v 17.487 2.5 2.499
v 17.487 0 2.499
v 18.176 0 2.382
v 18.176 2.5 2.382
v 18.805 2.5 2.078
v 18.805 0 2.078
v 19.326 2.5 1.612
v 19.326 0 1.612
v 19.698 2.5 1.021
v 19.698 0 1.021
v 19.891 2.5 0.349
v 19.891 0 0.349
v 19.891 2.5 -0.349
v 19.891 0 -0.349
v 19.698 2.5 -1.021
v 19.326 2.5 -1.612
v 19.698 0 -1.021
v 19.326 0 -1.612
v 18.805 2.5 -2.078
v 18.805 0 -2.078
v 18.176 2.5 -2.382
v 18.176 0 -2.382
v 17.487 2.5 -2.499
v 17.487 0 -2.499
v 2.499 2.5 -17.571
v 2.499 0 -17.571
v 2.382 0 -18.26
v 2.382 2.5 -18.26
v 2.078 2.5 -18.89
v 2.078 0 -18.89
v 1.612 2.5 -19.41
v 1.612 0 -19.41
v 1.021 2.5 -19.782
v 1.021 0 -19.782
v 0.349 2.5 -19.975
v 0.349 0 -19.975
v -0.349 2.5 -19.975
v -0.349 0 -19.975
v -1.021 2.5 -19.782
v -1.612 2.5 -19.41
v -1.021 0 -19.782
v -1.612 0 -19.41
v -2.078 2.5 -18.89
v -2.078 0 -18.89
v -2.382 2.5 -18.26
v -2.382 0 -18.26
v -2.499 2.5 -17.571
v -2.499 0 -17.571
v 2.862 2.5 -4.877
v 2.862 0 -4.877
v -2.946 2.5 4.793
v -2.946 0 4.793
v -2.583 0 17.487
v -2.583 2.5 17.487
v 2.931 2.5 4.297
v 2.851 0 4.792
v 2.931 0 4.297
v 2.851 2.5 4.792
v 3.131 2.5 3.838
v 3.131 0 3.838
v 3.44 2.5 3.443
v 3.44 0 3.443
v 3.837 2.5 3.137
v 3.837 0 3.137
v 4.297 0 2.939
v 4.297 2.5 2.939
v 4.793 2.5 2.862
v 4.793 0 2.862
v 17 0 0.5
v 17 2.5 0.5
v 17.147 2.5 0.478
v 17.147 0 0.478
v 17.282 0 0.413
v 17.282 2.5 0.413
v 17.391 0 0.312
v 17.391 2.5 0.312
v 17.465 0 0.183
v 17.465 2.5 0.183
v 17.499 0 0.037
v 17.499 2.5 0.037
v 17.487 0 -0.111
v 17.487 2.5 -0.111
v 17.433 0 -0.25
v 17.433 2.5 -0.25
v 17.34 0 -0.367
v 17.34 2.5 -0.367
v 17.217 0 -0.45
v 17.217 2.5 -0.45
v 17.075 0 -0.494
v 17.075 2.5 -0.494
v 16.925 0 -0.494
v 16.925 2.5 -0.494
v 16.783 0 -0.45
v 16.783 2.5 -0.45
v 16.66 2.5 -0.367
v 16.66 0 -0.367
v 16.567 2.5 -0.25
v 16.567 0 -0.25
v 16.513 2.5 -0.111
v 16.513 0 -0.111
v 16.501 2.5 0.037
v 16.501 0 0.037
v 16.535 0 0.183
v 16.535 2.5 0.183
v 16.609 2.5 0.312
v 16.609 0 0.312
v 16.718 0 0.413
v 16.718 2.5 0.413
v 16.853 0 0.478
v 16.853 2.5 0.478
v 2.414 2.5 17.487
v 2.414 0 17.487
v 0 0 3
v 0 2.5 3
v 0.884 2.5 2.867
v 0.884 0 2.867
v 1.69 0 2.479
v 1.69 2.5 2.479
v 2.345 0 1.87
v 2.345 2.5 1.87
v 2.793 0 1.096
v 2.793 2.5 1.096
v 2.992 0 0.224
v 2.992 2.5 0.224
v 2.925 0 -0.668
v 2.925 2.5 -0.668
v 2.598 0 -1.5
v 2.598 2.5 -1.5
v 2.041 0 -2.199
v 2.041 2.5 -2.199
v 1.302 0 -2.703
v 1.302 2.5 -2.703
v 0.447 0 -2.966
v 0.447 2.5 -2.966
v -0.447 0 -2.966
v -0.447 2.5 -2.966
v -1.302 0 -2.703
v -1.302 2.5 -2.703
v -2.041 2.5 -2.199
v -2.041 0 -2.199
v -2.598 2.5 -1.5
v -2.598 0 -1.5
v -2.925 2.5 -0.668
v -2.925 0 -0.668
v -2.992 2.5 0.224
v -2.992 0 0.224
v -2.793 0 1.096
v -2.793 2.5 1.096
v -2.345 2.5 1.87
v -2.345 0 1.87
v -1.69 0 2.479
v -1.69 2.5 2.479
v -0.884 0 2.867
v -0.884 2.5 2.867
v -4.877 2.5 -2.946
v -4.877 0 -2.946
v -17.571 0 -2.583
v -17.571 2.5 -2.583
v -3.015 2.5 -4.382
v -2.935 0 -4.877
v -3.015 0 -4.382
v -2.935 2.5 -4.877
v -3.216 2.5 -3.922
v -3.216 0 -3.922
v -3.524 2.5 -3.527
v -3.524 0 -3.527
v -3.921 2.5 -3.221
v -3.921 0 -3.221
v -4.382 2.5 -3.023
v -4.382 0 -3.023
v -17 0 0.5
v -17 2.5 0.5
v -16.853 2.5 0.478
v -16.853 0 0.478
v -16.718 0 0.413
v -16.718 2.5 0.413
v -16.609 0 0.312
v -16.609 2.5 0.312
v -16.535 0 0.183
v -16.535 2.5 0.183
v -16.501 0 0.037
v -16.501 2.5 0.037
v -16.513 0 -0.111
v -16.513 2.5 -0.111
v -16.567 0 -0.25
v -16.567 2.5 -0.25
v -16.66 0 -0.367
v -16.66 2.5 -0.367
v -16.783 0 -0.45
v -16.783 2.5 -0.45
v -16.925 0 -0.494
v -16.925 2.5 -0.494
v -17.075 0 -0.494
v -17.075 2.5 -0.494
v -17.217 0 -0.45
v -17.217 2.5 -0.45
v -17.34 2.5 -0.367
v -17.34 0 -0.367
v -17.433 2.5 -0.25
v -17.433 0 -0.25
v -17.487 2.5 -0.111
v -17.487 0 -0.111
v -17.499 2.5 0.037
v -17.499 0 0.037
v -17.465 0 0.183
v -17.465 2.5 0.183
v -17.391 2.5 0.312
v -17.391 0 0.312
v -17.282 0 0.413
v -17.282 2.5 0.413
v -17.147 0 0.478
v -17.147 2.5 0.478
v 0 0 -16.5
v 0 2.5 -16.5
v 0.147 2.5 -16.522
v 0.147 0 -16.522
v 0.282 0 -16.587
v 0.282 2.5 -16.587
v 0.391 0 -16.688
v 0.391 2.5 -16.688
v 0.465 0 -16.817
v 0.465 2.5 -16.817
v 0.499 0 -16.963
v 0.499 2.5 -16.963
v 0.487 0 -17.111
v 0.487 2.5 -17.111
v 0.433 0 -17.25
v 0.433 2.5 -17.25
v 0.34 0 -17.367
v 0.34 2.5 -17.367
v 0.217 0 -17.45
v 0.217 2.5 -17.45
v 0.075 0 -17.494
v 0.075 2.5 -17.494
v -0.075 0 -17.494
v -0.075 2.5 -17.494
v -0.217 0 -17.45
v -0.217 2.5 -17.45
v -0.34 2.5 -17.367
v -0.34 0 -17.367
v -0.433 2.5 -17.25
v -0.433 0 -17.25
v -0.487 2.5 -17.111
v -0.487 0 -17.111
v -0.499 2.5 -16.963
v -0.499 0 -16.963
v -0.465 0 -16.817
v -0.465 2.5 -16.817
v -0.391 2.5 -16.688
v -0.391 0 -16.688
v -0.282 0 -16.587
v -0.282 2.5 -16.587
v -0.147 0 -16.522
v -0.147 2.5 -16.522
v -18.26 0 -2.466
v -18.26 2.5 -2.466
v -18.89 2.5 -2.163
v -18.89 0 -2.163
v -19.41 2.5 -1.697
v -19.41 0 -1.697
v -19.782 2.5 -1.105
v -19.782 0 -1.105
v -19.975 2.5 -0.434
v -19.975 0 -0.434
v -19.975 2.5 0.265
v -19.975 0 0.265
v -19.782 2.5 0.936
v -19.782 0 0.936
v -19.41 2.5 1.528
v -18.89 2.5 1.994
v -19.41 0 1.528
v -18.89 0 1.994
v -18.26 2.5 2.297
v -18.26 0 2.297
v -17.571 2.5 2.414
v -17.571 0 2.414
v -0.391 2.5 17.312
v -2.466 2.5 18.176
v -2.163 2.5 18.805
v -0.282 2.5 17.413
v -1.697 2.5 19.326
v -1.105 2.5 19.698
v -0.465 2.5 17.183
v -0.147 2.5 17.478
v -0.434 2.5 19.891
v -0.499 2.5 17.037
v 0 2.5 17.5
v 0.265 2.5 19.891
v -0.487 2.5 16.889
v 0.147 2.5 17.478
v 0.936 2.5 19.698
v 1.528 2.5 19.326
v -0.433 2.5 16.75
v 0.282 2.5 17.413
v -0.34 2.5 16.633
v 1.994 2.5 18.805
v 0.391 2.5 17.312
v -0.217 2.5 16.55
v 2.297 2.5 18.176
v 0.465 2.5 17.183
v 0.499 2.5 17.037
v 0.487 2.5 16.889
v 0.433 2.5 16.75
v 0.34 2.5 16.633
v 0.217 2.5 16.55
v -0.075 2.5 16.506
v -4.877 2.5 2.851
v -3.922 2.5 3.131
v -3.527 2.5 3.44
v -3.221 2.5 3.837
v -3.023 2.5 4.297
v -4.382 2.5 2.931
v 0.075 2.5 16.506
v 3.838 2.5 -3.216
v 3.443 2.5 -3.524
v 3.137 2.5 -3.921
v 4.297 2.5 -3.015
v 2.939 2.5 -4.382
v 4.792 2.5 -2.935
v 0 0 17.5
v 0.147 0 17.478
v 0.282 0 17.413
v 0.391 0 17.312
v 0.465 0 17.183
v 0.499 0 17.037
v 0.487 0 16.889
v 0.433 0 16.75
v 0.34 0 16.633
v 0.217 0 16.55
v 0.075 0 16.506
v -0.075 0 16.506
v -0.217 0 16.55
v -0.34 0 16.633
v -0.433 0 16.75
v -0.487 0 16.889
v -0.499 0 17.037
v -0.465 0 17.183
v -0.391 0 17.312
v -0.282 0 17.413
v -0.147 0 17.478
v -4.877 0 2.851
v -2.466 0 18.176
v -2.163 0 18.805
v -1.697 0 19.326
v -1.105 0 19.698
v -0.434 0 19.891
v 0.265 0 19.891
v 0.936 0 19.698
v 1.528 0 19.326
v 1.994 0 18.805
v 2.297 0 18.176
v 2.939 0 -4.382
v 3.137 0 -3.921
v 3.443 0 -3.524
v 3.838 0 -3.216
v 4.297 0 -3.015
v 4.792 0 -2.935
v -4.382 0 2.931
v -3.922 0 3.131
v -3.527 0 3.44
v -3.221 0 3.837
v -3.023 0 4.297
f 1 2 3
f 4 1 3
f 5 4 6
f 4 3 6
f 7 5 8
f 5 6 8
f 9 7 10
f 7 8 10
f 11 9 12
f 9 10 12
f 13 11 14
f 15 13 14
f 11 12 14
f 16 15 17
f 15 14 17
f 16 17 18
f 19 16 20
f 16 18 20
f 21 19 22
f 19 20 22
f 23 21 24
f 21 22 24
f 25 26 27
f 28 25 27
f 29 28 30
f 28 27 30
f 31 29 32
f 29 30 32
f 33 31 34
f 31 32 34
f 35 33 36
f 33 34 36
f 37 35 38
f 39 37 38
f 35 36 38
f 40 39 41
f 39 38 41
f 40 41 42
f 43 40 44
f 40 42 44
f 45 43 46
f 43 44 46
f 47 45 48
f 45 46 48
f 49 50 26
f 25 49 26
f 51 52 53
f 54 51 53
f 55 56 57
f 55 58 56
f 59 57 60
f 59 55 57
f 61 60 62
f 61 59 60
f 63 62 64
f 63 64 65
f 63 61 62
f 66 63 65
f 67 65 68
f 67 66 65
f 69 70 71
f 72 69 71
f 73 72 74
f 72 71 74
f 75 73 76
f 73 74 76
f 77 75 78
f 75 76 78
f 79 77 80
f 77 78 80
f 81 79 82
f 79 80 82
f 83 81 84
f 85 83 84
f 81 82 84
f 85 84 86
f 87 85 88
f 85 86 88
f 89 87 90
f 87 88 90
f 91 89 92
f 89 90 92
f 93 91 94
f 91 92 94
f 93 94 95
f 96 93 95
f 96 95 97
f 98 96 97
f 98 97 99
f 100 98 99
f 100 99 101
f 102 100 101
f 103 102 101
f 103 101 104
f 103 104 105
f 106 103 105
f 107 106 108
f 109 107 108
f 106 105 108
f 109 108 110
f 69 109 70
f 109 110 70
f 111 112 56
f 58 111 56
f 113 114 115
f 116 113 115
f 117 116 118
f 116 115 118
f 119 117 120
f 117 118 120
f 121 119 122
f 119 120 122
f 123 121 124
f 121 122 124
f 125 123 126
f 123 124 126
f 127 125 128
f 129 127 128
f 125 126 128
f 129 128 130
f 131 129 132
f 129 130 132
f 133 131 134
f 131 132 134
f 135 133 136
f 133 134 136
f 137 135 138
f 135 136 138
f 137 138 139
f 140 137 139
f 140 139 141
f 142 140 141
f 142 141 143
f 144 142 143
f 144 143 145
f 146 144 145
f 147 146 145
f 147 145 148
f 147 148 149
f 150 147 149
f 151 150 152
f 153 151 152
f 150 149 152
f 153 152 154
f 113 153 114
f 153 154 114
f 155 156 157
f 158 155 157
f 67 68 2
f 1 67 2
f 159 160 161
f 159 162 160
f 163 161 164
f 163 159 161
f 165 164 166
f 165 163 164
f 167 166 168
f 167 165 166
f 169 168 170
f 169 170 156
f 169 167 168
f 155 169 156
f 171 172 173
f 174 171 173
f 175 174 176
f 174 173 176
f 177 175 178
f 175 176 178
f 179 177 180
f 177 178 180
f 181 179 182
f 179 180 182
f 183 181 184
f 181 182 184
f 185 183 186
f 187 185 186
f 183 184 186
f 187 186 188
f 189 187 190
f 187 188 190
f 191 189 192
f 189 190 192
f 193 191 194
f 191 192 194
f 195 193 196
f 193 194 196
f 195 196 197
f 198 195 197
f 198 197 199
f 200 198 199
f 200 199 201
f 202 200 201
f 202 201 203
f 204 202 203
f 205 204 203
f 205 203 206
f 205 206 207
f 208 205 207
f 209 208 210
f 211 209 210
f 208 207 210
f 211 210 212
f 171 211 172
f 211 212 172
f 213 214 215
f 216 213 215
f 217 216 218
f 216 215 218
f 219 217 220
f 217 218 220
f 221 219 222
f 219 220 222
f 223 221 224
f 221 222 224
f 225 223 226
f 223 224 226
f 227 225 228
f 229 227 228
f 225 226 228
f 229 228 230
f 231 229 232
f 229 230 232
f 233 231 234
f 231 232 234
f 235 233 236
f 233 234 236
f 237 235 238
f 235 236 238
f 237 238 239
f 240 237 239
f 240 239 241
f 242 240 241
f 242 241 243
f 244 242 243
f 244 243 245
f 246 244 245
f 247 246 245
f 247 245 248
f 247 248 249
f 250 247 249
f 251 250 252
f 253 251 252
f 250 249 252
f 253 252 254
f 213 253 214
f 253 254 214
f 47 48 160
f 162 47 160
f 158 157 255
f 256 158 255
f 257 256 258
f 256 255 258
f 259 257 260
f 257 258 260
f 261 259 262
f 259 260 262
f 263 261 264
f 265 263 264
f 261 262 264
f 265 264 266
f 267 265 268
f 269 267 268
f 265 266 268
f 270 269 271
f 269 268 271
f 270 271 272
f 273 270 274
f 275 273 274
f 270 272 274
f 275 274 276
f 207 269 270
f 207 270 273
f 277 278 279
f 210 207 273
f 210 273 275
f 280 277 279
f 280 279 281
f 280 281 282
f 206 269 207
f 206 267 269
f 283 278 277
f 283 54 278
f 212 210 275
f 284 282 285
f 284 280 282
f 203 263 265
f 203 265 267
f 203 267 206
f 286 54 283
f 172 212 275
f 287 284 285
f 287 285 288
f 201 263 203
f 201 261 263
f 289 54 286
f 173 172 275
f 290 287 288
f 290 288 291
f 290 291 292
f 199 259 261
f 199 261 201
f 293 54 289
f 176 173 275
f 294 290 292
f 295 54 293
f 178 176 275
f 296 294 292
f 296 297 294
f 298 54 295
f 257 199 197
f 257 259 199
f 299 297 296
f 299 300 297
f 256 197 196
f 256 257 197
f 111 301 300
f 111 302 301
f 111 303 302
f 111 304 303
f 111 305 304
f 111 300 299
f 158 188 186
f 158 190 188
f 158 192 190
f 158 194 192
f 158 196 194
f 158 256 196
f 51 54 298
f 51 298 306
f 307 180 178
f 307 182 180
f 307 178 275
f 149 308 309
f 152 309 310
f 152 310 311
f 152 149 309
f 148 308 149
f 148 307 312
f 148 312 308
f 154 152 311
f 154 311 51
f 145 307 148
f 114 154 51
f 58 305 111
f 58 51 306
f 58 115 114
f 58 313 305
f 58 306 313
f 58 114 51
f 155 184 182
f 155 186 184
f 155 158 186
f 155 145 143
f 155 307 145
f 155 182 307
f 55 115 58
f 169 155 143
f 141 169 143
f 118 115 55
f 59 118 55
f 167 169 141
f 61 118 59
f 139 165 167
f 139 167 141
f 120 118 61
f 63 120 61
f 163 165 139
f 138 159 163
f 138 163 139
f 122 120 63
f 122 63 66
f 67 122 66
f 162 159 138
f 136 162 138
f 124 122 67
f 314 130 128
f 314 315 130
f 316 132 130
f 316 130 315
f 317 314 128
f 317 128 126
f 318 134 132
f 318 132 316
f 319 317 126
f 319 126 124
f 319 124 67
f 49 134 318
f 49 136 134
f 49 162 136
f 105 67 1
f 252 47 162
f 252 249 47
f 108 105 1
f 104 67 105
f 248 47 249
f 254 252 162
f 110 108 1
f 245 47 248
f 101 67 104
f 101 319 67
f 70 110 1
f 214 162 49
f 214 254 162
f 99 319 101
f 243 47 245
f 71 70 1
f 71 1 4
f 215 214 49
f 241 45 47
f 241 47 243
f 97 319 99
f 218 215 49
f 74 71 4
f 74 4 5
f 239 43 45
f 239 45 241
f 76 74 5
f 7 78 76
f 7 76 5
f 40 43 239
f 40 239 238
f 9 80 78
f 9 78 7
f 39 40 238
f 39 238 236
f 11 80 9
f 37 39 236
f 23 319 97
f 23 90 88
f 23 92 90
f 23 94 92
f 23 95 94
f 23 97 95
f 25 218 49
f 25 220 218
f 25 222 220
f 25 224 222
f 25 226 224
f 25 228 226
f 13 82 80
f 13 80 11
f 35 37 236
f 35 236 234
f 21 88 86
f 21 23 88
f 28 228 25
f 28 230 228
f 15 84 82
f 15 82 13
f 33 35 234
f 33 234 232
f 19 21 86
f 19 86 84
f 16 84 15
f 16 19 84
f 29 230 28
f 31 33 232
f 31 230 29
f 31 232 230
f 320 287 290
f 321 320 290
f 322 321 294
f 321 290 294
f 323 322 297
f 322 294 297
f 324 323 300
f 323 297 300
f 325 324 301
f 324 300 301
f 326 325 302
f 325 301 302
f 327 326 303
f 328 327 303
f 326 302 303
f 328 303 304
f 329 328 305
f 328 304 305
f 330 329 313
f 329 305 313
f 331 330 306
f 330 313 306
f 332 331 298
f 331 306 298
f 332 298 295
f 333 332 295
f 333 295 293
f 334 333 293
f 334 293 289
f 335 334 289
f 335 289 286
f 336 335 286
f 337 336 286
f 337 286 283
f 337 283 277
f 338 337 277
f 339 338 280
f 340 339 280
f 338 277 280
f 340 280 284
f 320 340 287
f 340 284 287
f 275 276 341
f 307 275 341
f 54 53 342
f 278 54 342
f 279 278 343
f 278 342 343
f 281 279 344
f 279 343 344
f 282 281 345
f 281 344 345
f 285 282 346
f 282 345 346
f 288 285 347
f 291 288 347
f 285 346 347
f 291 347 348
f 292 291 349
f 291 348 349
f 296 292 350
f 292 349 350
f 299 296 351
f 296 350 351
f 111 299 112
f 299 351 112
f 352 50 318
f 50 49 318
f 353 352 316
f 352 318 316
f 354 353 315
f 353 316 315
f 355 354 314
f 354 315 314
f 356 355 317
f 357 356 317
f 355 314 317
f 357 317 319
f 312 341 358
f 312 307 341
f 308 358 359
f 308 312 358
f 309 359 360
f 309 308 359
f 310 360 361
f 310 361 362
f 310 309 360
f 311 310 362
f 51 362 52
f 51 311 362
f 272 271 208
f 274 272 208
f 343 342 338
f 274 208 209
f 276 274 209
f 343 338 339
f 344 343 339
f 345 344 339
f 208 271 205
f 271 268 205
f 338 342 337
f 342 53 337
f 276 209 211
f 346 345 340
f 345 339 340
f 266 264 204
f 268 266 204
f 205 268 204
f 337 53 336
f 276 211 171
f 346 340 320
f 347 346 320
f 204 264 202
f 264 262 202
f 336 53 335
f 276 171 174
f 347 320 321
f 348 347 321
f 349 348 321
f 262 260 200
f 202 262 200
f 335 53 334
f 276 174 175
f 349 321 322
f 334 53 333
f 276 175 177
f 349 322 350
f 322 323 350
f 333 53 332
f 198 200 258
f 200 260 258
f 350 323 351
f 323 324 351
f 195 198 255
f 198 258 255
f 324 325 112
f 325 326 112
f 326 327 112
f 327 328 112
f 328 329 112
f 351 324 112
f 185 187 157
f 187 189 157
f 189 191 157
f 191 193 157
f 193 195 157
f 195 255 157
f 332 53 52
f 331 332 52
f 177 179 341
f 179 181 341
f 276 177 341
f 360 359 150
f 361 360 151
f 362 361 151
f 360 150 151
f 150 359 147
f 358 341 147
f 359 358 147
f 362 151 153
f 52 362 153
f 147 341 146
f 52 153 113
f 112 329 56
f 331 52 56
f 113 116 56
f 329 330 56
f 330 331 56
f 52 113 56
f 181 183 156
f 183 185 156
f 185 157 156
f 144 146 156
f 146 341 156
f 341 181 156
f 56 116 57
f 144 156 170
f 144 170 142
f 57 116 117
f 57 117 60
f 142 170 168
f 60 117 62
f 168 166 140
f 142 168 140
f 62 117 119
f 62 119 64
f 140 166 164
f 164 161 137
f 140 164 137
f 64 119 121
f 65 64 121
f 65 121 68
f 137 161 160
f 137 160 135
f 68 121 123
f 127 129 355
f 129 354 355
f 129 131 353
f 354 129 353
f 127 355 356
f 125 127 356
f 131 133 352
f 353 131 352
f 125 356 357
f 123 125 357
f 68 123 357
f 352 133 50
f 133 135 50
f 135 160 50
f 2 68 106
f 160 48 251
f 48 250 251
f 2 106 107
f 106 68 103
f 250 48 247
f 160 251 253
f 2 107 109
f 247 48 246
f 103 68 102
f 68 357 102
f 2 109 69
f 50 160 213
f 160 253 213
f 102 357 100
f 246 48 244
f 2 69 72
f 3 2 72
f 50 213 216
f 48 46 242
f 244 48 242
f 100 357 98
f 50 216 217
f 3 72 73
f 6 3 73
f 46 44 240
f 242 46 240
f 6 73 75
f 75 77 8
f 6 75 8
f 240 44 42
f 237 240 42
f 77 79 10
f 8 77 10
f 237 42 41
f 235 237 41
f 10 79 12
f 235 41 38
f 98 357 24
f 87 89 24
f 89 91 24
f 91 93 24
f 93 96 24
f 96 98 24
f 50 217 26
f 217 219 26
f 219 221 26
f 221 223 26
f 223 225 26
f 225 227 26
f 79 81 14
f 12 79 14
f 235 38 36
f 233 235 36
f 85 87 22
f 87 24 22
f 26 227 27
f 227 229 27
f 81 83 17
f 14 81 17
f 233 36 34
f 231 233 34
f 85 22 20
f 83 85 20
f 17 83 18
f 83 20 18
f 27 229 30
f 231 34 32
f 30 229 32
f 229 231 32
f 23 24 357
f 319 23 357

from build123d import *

# Parameters (mm, degrees)
BOSS_EXTRUDE1_DEPTH = 2.5
FILLET1_R           = 2
SKETCH3_R           = 0.5
SKETCH3_R_2         = 3
CUT_EXTRUDE1_DEPTH  = 2.5


with BuildPart() as part:
    # Sketch1 → Boss-Extrude1 (new body)
    with BuildSketch(Plane(origin=(0, 0, 0), x_dir=(1, 0, 0), z_dir=(0, 1, 0))):
        with BuildLine():
            Line((2.915475138, 3), (2.498974366, 17.571434122))
            ThreePointArc((2.498974366, 17.571434122), (0, 20), (-2.498974366, 17.571434122))
            Line((-2.498974366, 17.571434122), (-3, 3))
            Line((-3, 3), (-17.571434122, 2.583499228))
            ThreePointArc((-17.571434122, 2.583499228), (-20, 0.084524862), (-17.571434122, -2.414449503))
            Line((-17.571434122, -2.414449503), (-3, -2.915475138))
            Line((-3, -2.915475138), (-2.583499228, -17.48690926))
            ThreePointArc((-2.583499228, -17.48690926), (-0.084524862, -19.915475138), (2.414449503, -17.48690926))
            Line((2.414449503, -17.48690926), (2.915475138, -2.915475138))
            Line((2.915475138, -2.915475138), (17.48690926, -2.498974366))
            ThreePointArc((17.48690926, -2.498974366), (19.915475138, 0), (17.48690926, 2.498974366))
            Line((17.48690926, 2.498974366), (2.915475138, 3))
        make_face()
    extrude(amount=BOSS_EXTRUDE1_DEPTH)

    # Fillet1
    fillet1_edges = [part.edges().sort_by_distance(p)[0] for p in [
        (-3, 1.25, 2.915475138),
        (-3, 1.25, -3),
        (2.915475138, 1.25, -3),
        (2.915475138, 1.25, 2.915475138),
    ]]
    fillet(fillet1_edges, radius=FILLET1_R)

    # Sketch3 → Cut-Extrude1 (cut)
    with BuildSketch(Plane(origin=(0, 2.5, 0), x_dir=(1, 0, 0), z_dir=(0, 1, 0))):
        with Locations(Location((0, 17, 0), (0, 0, 270))):
            Circle(SKETCH3_R)
        with Locations(Location((17, 0, 0), (0, 0, 270))):
            Circle(SKETCH3_R)
        with Locations(Location((0, -17, 0), (0, 0, 270))):
            Circle(SKETCH3_R)
        with Locations(Location((-17, 0, 0), (0, 0, 270))):
            Circle(SKETCH3_R)
        with Locations(Location((0, 0, 0), (0, 0, 270))):
            Circle(SKETCH3_R_2)
    extrude(amount=-CUT_EXTRUDE1_DEPTH, mode=Mode.SUBTRACT)


solid = part.part
